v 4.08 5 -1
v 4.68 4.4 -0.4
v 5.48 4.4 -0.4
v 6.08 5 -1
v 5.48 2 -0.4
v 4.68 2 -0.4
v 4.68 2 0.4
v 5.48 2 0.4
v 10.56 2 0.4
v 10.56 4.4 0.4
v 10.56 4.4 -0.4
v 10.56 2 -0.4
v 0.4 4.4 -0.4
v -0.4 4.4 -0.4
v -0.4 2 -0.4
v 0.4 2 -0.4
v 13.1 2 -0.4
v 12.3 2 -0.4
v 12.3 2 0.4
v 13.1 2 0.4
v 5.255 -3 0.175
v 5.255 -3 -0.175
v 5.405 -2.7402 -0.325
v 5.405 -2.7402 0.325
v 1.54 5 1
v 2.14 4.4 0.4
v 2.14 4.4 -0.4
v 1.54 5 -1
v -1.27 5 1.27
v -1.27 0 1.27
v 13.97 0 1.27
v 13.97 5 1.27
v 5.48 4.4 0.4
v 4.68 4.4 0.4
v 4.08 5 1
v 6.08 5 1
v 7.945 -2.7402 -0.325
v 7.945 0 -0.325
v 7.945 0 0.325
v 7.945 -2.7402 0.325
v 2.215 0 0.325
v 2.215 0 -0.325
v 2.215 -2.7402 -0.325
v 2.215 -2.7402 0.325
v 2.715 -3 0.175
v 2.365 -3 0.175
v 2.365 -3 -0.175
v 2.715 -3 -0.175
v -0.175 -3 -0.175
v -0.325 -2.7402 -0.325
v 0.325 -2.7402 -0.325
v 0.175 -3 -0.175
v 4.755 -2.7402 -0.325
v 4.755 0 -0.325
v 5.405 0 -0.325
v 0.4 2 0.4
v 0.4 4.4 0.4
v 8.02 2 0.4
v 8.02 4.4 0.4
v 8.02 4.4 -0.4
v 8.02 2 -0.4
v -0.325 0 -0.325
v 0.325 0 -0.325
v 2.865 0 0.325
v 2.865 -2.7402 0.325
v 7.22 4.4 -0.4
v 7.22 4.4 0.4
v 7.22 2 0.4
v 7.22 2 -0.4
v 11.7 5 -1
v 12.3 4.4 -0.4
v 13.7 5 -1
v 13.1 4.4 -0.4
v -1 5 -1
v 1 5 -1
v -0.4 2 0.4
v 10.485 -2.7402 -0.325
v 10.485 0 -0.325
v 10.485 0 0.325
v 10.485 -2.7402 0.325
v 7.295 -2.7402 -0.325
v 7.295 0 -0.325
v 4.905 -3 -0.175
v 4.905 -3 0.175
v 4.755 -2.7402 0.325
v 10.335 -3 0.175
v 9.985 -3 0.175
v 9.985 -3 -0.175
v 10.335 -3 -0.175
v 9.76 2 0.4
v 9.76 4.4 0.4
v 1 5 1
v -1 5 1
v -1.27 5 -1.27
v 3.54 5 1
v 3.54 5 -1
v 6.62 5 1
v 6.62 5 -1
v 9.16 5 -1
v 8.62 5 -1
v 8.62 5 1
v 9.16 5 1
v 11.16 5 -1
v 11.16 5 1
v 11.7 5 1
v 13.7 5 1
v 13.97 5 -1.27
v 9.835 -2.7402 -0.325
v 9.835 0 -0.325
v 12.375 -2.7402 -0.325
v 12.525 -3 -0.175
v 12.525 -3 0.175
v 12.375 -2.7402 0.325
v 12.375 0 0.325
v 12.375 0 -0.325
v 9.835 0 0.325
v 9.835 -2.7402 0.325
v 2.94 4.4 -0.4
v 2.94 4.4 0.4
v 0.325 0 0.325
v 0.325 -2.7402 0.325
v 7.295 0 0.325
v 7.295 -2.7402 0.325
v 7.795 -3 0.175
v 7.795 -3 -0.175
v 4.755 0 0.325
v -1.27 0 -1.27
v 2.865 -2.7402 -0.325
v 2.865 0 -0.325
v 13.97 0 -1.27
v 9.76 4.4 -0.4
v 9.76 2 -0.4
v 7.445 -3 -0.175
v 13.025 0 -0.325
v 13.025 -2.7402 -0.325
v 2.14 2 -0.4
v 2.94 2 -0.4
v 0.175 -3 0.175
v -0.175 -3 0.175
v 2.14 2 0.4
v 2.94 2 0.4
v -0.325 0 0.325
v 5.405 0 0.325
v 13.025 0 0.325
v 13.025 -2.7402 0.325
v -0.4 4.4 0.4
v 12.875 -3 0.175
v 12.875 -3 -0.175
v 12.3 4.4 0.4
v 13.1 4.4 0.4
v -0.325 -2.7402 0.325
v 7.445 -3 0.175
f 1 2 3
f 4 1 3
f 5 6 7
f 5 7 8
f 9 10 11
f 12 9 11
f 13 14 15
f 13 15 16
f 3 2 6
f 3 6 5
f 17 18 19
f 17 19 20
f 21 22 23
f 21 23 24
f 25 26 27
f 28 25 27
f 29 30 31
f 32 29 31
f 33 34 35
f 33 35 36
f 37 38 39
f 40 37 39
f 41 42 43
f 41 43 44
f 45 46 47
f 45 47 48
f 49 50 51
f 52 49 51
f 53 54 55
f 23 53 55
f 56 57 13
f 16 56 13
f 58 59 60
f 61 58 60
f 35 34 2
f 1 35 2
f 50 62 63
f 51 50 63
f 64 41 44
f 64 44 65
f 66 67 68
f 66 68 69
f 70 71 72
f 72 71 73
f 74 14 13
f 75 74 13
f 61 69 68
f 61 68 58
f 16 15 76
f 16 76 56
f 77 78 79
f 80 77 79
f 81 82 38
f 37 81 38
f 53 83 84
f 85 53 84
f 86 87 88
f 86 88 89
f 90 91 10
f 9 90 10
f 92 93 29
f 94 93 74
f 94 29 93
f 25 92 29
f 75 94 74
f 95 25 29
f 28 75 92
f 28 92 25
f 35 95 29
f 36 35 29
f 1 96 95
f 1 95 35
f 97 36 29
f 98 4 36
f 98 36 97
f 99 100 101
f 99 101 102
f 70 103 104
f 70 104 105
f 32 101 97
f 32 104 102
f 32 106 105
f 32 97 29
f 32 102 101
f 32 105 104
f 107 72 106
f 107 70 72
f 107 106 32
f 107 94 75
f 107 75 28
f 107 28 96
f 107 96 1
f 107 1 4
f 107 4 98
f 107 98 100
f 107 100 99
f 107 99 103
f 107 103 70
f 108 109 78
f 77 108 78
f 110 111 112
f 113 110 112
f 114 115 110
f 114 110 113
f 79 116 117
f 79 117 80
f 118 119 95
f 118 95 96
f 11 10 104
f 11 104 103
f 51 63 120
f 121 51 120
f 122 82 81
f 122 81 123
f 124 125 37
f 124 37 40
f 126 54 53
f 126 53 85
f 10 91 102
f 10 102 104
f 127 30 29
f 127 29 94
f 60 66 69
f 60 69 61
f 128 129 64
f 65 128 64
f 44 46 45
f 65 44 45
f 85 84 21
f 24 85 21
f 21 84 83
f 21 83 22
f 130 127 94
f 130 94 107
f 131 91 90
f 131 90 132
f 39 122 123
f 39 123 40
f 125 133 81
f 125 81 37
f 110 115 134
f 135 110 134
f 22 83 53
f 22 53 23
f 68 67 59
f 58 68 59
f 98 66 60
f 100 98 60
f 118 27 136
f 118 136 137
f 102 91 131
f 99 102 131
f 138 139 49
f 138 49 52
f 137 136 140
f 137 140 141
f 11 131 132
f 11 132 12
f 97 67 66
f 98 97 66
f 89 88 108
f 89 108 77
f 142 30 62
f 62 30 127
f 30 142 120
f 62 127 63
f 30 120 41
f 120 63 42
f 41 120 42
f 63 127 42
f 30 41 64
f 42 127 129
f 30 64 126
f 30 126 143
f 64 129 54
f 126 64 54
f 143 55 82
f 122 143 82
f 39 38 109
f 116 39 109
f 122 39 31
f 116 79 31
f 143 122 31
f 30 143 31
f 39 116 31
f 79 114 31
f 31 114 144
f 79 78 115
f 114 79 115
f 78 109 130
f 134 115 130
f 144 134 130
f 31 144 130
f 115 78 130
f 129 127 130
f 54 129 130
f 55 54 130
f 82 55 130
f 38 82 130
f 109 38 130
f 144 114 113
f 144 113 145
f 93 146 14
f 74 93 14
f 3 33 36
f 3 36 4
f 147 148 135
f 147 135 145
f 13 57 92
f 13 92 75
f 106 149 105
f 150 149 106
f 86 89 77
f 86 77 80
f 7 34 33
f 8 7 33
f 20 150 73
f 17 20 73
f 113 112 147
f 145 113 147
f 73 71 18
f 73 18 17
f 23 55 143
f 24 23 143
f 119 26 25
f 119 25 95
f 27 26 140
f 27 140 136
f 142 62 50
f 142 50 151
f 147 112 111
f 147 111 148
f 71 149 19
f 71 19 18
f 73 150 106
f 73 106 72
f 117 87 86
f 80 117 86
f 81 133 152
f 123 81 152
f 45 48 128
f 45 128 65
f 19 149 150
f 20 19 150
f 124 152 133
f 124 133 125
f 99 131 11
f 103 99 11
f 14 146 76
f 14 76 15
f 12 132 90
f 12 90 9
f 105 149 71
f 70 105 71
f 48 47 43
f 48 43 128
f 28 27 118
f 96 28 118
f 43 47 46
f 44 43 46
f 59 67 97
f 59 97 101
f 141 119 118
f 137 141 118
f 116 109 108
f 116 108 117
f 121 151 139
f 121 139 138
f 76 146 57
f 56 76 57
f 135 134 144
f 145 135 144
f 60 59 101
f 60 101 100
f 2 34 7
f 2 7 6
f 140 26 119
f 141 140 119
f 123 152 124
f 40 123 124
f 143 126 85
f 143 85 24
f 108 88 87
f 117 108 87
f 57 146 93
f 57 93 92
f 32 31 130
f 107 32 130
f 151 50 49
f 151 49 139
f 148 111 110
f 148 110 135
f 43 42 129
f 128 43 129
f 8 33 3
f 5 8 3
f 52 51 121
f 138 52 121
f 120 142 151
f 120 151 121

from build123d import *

# Parameters (mm, degrees)
SKETCH1_W                   = 2.54
SKETCH1_H                   = 2.54
BOSS_EXTRUDE1_DEPTH         = 5
SKETCH2_W                   = 0.65
SKETCH2_H                   = 0.65
BOSS_EXTRUDE2_DEPTH         = 3
CHAMFER1_SIZE               = 0.15
CHAMFER1_SIZE2              = 0.259807621
SKETCH3_W                   = 0.8
SKETCH3_H                   = 0.8
CUT_EXTRUDE1_DEPTH          = 3
CHAMFER2_SIZE               = 0.6
LPATTERN1_COUNT             = 6
LPATTERN1_PITCH             = 2.54
CHAMFER1_OF_LPATTERN1_SIZE2 = 0.15
CHAMFER1_OF_LPATTERN1_SIZE  = 0.259807621
CHAMFER2_OF_LPATTERN1_SIZE  = 0.6


with BuildPart() as part:
    # Sketch1 → Boss-Extrude1 (new body)
    with BuildSketch(Plane(origin=(0, 0, 0), x_dir=(1, 0, 0), z_dir=(0, 1, 0))):
        Rectangle(SKETCH1_W, SKETCH1_H)
    boss_extrude1 = extrude(amount=BOSS_EXTRUDE1_DEPTH)

    # Sketch2 → Boss-Extrude2 (add)
    with BuildSketch(Plane.XZ):
        Rectangle(SKETCH2_W, SKETCH2_H)
    boss_extrude2 = extrude(amount=BOSS_EXTRUDE2_DEPTH)

    # Chamfer1
    chamfer1_edges = [part.edges().sort_by_distance(p)[0] for p in [
        (0.325, -3, 0),
        (0, -3, 0.325),
        (-0.325, -3, 0),
        (0, -3, -0.325),
    ]]
    chamfer1_side = [part.faces().sort_by_distance(p)[0] for p in [
        (0, -3, 0),
    ]]
    chamfer(chamfer1_edges, length=CHAMFER1_SIZE, length2=CHAMFER1_SIZE2, reference=chamfer1_side[0])

    # Sketch3 → Cut-Extrude1 (cut)
    with BuildSketch(Plane(origin=(0, 5, 0), x_dir=(1, 0, 0), z_dir=(0, 1, 0))):
        Rectangle(SKETCH3_W, SKETCH3_H)
    cut_extrude1 = extrude(amount=-CUT_EXTRUDE1_DEPTH, mode=Mode.SUBTRACT)

    # Chamfer2
    chamfer2_edges = [part.edges().sort_by_distance(p)[0] for p in [
        (0.4, 5, 0),
        (0, 5, -0.4),
        (-0.4, 5, 0),
        (0, 5, 0.4),
    ]]
    chamfer(chamfer2_edges, length=CHAMFER2_SIZE)

    # LPattern1: Boss-Extrude1, Boss-Extrude2, Cut-Extrude1 ×6
    with Locations(*[(i * LPATTERN1_PITCH, 0, 0) for i in range(1, LPATTERN1_COUNT)]):
        add(boss_extrude1)
        add(boss_extrude2)
        add(cut_extrude1, mode=Mode.SUBTRACT)

    # Chamfer1 of LPattern1
    chamfer1_of_lpattern1_edges = [part.edges().sort_by_distance(p)[0] for p in [
        (2.865, -3, 0),
        (2.54, -3, 0.325),
        (2.215, -3, 0),
        (2.54, -3, -0.325),
        (5.405, -3, 0),
        (5.08, -3, 0.325),
        (4.755, -3, 0),
        (5.08, -3, -0.325),
        (7.945, -3, 0),
        (7.62, -3, 0.325),
        (7.295, -3, 0),
        (7.62, -3, -0.325),
        (10.485, -3, 0),
        (10.16, -3, 0.325),
        (9.835, -3, 0),
        (10.16, -3, -0.325),
        (13.025, -3, 0),
        (12.7, -3, 0.325),
        (12.375, -3, 0),
        (12.7, -3, -0.325),
    ]]
    chamfer(chamfer1_of_lpattern1_edges, length=CHAMFER1_OF_LPATTERN1_SIZE, length2=CHAMFER1_OF_LPATTERN1_SIZE2)

    # Chamfer2 of LPattern1
    chamfer2_of_lpattern1_edges = [part.edges().sort_by_distance(p)[0] for p in [
        (2.94, 5, 0),
        (2.54, 5, -0.4),
        (2.14, 5, 0),
        (2.54, 5, 0.4),
        (5.48, 5, 0),
        (5.08, 5, -0.4),
        (4.68, 5, 0),
        (5.08, 5, 0.4),
        (8.02, 5, 0),
        (7.62, 5, -0.4),
        (7.22, 5, 0),
        (7.62, 5, 0.4),
        (10.56, 5, 0),
        (10.16, 5, -0.4),
        (9.76, 5, 0),
        (10.16, 5, 0.4),
        (13.1, 5, 0),
        (12.7, 5, -0.4),
        (12.3, 5, 0),
        (12.7, 5, 0.4),
    ]]
    chamfer(chamfer2_of_lpattern1_edges, length=CHAMFER2_OF_LPATTERN1_SIZE)


solid = part.part
